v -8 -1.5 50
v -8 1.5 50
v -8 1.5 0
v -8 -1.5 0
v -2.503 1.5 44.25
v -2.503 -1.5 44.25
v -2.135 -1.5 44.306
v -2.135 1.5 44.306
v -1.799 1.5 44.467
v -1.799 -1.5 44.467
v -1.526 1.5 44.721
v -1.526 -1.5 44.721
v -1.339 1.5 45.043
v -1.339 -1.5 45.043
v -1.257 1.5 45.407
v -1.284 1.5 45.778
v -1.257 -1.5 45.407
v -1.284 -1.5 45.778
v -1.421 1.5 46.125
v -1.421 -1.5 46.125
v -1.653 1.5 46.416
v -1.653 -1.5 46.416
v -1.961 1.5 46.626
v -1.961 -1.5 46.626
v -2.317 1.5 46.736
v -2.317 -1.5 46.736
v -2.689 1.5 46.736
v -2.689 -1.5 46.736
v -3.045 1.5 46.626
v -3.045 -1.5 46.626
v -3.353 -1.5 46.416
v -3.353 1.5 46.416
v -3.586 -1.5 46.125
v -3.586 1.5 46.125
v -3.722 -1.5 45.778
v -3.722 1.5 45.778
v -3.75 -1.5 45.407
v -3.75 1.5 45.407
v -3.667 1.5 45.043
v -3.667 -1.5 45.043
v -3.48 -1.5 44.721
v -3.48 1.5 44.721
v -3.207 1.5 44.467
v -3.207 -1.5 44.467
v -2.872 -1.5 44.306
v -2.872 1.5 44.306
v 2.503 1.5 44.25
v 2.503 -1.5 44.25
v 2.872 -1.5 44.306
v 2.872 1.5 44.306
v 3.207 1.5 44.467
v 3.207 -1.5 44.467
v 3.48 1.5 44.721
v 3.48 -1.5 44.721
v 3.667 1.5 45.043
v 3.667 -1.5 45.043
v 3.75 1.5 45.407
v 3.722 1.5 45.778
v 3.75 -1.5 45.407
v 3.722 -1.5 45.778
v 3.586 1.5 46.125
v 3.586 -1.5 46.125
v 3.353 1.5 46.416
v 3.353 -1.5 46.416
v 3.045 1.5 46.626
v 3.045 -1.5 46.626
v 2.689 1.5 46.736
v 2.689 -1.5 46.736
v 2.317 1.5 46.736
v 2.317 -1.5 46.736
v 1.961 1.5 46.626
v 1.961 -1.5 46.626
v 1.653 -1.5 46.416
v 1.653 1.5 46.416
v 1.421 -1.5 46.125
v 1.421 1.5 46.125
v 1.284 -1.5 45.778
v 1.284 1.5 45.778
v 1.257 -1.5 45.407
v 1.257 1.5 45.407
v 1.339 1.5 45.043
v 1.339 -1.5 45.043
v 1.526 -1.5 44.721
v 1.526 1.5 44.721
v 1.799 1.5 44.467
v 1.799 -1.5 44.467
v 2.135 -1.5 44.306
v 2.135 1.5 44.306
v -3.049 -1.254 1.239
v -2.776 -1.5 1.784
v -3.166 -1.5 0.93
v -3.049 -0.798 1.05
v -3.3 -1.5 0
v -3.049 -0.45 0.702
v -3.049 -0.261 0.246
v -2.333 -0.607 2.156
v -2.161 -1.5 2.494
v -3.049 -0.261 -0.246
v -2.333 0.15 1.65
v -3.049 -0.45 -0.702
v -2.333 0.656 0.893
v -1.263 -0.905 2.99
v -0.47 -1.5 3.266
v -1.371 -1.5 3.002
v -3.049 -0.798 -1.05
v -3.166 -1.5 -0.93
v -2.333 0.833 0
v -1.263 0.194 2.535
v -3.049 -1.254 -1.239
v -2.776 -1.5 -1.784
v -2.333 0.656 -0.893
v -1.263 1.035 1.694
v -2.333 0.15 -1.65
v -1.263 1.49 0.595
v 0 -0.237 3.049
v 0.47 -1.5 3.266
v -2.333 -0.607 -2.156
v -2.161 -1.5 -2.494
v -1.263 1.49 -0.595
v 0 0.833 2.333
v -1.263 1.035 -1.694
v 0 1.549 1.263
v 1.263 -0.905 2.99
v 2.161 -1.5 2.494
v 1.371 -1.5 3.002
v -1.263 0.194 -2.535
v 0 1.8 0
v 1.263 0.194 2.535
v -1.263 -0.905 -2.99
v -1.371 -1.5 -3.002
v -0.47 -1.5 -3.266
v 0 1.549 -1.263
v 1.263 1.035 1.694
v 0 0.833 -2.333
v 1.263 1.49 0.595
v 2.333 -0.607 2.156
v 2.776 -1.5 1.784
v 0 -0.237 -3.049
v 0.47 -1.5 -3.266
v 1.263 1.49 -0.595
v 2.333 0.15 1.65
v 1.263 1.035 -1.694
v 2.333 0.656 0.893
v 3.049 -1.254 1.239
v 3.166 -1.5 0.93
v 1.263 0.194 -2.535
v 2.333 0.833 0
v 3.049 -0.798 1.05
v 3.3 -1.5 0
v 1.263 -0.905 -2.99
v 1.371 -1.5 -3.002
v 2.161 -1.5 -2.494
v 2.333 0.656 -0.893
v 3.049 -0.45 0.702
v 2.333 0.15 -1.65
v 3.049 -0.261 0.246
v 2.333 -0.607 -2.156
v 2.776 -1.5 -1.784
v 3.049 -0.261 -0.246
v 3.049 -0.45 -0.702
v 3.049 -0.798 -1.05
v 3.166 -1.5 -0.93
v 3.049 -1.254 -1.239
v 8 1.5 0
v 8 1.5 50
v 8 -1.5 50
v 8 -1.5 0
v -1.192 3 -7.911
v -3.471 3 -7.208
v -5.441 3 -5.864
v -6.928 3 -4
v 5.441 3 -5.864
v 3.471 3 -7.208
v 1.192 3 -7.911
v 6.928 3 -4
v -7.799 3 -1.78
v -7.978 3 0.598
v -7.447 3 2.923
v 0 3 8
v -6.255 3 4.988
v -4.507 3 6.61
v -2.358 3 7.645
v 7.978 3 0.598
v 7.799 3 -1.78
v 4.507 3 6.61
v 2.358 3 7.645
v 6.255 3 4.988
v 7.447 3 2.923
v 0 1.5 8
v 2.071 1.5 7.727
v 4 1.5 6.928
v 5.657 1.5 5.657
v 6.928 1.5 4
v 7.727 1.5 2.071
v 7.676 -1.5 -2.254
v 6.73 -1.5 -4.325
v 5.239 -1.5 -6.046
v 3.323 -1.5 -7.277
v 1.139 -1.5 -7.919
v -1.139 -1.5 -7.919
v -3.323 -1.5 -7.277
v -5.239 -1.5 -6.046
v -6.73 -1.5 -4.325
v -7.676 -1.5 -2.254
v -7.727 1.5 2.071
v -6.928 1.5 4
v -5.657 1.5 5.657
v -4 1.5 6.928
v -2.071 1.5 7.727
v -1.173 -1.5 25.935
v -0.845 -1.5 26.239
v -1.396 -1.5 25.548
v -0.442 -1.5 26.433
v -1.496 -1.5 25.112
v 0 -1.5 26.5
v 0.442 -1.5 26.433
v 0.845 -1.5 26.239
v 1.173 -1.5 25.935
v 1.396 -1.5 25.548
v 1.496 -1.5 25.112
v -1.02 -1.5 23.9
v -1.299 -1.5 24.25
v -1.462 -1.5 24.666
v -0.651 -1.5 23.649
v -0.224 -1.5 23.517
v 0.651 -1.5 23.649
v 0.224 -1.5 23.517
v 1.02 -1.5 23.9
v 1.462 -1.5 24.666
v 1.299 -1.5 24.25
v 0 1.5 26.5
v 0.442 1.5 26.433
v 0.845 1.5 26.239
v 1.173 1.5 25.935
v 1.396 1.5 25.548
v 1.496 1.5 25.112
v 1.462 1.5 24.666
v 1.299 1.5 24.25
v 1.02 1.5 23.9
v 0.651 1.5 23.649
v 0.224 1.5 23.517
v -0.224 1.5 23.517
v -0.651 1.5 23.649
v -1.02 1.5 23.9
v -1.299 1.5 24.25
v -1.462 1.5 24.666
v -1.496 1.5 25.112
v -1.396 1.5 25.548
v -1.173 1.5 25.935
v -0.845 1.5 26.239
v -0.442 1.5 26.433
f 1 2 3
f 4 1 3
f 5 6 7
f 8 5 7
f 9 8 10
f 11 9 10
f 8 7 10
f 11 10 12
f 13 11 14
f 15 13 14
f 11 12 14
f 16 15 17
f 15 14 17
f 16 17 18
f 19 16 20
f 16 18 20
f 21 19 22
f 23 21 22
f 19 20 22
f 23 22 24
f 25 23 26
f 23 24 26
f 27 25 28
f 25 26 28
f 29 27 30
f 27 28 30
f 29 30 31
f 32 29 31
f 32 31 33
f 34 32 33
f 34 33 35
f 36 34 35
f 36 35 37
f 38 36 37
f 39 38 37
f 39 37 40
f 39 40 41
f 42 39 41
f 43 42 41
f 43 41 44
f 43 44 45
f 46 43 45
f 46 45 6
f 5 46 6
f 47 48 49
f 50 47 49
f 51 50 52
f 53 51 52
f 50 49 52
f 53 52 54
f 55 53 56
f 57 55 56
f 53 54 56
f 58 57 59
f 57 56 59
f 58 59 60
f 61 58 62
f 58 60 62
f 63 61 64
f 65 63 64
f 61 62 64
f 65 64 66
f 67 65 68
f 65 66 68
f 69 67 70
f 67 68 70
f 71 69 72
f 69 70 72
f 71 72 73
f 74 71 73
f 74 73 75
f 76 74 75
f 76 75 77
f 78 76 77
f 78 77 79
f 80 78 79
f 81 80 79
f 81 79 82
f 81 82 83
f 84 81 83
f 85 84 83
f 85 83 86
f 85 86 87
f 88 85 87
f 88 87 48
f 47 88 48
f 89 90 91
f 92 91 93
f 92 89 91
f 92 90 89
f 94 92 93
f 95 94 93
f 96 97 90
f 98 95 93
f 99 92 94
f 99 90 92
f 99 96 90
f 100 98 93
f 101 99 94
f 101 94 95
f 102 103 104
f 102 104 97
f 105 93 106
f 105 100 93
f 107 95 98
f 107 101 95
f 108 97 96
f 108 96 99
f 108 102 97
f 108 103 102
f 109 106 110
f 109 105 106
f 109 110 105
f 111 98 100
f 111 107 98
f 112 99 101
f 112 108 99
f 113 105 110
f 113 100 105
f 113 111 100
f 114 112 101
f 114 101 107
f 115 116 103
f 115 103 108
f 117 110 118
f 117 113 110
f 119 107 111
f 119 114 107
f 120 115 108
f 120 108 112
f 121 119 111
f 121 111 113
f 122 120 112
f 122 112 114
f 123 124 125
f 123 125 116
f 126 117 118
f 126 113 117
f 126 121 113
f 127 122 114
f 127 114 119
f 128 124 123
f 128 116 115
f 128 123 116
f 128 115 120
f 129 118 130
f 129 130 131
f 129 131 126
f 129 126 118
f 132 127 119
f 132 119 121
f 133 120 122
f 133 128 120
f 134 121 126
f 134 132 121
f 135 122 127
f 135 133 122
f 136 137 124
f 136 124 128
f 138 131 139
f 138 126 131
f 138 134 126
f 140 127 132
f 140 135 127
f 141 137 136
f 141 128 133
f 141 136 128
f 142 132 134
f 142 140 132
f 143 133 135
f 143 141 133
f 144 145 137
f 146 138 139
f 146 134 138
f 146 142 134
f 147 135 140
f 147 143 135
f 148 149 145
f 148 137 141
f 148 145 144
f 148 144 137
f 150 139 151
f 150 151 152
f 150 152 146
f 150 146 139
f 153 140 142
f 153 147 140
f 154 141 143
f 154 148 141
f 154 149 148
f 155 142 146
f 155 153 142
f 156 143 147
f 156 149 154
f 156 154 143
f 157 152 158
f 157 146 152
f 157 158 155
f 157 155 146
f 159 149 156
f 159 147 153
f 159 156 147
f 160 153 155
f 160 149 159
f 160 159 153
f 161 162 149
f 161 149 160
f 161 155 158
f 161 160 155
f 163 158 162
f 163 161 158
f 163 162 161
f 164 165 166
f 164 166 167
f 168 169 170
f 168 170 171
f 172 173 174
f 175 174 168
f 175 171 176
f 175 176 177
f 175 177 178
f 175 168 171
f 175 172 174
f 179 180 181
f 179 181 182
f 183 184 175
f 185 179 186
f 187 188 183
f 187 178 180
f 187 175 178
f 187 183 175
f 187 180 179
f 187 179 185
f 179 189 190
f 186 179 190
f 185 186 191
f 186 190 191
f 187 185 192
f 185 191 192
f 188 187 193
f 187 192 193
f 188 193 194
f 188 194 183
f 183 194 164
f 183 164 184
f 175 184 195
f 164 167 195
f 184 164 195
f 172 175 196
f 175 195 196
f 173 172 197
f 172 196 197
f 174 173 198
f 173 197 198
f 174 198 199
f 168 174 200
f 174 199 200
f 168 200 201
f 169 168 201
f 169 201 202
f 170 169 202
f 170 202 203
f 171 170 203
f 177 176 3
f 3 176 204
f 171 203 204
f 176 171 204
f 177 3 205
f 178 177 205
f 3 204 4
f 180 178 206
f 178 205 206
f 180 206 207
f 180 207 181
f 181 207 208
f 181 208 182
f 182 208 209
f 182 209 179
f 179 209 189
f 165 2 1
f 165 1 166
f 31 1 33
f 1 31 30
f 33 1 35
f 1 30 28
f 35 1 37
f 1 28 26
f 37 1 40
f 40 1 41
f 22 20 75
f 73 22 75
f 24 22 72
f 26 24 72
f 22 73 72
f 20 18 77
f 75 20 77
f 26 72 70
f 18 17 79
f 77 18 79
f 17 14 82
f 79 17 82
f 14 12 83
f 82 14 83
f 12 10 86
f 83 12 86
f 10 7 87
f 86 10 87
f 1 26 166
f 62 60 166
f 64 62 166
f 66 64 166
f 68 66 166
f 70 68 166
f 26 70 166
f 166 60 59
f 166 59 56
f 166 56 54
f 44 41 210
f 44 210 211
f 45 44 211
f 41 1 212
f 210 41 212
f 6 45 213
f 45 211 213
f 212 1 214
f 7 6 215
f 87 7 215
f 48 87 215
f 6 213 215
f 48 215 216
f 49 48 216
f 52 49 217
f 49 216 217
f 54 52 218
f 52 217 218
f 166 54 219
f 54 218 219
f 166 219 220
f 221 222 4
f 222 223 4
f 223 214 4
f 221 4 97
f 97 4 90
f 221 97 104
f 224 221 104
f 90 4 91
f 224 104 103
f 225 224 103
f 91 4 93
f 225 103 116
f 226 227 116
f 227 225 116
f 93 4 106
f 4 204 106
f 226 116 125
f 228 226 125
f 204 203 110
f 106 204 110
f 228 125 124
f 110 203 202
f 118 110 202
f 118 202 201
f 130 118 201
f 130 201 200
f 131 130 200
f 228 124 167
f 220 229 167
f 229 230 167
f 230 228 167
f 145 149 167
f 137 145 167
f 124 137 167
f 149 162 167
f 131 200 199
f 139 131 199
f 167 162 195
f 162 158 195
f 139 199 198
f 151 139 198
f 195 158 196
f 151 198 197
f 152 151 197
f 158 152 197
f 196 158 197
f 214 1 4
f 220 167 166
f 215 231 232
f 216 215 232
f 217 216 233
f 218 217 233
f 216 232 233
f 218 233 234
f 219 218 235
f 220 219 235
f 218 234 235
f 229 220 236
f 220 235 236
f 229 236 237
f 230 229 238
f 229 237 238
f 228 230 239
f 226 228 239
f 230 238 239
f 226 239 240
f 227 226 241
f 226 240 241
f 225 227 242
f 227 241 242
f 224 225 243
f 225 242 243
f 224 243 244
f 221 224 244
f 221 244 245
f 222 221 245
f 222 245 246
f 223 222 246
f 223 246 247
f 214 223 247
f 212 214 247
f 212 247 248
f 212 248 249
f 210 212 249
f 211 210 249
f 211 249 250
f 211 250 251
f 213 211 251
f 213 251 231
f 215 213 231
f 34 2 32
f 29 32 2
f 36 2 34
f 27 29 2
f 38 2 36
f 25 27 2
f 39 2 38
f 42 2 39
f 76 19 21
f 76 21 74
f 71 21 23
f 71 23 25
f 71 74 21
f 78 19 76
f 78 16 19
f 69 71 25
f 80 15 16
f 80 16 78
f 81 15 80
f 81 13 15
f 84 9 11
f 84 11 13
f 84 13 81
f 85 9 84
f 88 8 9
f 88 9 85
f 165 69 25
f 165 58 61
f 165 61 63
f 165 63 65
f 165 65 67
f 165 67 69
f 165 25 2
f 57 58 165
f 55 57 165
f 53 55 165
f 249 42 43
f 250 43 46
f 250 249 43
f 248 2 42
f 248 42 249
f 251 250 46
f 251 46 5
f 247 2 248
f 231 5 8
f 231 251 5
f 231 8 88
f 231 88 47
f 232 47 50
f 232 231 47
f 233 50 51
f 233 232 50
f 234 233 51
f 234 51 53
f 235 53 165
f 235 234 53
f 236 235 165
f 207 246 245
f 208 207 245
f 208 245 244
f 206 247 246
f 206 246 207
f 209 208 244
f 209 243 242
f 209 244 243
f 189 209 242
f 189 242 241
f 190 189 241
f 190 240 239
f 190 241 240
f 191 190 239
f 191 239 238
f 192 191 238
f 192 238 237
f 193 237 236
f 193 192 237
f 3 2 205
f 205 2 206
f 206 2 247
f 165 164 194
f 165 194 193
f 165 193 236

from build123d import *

# Parameters (mm, degrees)
BOSS_EXTRUDE1_DEPTH      = 3
BOSS_EXTRUDE1_DEPTH_BACK = 1.5
SKETCH1_R                = 8
SKETCH2_W                = 16
SKETCH2_H                = 50
BOSS_EXTRUDE2_DEPTH      = 1.5
CUT_EXTRUDE1_REACH       = 52.836
SKETCH3_R                = 1.25
CUT_EXTRUDE3_REACH       = 52.725
SKETCH5_R                = 1.5


with BuildPart() as part:
    # Sketch1 → Boss-Extrude1 (new, two sides: drawn at the far end of the back side and taken through both)
    with BuildSketch(Plane(origin=(0, 0, 0), x_dir=(1, 0, 0), z_dir=(0, 1, 0)).offset(-BOSS_EXTRUDE1_DEPTH_BACK)):
        Circle(SKETCH1_R)
    extrude(amount=BOSS_EXTRUDE1_DEPTH + BOSS_EXTRUDE1_DEPTH_BACK)

    # Sketch2 → Boss-Extrude2 (add, symmetric)
    with BuildSketch(Plane(origin=(0, 0, 0), x_dir=(1, 0, 0), z_dir=(0, 1, 0))):
        with Locations((0, -25)):
            Rectangle(SKETCH2_W, SKETCH2_H)
    extrude(amount=BOSS_EXTRUDE2_DEPTH, both=True)

    # Sketch3 → Cut-Extrude1 (cut, up to next)
    with BuildSketch(Plane(origin=(0, -1.5, 0), x_dir=(-1, 0, 0), z_dir=(0, -1, 0)), mode=Mode.PRIVATE) as cut_extrude1_sk1:
        with Locations((2.503073418, -45.5)):
            Circle(SKETCH3_R)
    cut_extrude1_tool1 = extrude(cut_extrude1_sk1.sketch, amount=-CUT_EXTRUDE1_REACH, mode=Mode.PRIVATE) & part.part
    # Sketch3 → Cut-Extrude1 (cut, up to next)
    with BuildSketch(Plane(origin=(0, -1.5, 0), x_dir=(-1, 0, 0), z_dir=(0, -1, 0)), mode=Mode.PRIVATE) as cut_extrude1_sk2:
        with Locations((-2.503073418, -45.5)):
            Circle(SKETCH3_R)
    cut_extrude1_tool2 = extrude(cut_extrude1_sk2.sketch, amount=-CUT_EXTRUDE1_REACH, mode=Mode.PRIVATE) & part.part
    add(cut_extrude1_tool1.solids().sort_by_distance((-2.503073, -1.5, 45.5))[0], mode=Mode.SUBTRACT)
    add(cut_extrude1_tool2.solids().sort_by_distance((2.503073, -1.5, 45.5))[0], mode=Mode.SUBTRACT)

    # Sketch4 → Cut-Revolve21 (revolve, cut)
    with BuildSketch(Plane(origin=(0, -1.5, 0), x_dir=(-1, 0, 0), z_dir=(0, -1, 0))):
        with BuildLine():
            Line((3.3, 0), (-3.3, 0))
            ThreePointArc((-3.3, 0), (0, -3.3), (3.3, 0))
        make_face()
    revolve(axis=Axis((3.3, -1.5, 0), (-1, 0, 0)), mode=Mode.SUBTRACT)

    # Sketch5 → Cut-Extrude3 (cut, up to next)
    with BuildSketch(Plane(origin=(0, 1.5, 0), x_dir=(1, 0, 0), z_dir=(0, 1, 0)), mode=Mode.PRIVATE) as cut_extrude3_sk1:
        with Locations((0, -25)):
            Circle(SKETCH5_R)
    cut_extrude3_tool1 = extrude(cut_extrude3_sk1.sketch, amount=-CUT_EXTRUDE3_REACH, mode=Mode.PRIVATE) & part.part
    add(cut_extrude3_tool1.solids().sort_by_distance((0, 1.5, 25))[0], mode=Mode.SUBTRACT)


solid = part.part
